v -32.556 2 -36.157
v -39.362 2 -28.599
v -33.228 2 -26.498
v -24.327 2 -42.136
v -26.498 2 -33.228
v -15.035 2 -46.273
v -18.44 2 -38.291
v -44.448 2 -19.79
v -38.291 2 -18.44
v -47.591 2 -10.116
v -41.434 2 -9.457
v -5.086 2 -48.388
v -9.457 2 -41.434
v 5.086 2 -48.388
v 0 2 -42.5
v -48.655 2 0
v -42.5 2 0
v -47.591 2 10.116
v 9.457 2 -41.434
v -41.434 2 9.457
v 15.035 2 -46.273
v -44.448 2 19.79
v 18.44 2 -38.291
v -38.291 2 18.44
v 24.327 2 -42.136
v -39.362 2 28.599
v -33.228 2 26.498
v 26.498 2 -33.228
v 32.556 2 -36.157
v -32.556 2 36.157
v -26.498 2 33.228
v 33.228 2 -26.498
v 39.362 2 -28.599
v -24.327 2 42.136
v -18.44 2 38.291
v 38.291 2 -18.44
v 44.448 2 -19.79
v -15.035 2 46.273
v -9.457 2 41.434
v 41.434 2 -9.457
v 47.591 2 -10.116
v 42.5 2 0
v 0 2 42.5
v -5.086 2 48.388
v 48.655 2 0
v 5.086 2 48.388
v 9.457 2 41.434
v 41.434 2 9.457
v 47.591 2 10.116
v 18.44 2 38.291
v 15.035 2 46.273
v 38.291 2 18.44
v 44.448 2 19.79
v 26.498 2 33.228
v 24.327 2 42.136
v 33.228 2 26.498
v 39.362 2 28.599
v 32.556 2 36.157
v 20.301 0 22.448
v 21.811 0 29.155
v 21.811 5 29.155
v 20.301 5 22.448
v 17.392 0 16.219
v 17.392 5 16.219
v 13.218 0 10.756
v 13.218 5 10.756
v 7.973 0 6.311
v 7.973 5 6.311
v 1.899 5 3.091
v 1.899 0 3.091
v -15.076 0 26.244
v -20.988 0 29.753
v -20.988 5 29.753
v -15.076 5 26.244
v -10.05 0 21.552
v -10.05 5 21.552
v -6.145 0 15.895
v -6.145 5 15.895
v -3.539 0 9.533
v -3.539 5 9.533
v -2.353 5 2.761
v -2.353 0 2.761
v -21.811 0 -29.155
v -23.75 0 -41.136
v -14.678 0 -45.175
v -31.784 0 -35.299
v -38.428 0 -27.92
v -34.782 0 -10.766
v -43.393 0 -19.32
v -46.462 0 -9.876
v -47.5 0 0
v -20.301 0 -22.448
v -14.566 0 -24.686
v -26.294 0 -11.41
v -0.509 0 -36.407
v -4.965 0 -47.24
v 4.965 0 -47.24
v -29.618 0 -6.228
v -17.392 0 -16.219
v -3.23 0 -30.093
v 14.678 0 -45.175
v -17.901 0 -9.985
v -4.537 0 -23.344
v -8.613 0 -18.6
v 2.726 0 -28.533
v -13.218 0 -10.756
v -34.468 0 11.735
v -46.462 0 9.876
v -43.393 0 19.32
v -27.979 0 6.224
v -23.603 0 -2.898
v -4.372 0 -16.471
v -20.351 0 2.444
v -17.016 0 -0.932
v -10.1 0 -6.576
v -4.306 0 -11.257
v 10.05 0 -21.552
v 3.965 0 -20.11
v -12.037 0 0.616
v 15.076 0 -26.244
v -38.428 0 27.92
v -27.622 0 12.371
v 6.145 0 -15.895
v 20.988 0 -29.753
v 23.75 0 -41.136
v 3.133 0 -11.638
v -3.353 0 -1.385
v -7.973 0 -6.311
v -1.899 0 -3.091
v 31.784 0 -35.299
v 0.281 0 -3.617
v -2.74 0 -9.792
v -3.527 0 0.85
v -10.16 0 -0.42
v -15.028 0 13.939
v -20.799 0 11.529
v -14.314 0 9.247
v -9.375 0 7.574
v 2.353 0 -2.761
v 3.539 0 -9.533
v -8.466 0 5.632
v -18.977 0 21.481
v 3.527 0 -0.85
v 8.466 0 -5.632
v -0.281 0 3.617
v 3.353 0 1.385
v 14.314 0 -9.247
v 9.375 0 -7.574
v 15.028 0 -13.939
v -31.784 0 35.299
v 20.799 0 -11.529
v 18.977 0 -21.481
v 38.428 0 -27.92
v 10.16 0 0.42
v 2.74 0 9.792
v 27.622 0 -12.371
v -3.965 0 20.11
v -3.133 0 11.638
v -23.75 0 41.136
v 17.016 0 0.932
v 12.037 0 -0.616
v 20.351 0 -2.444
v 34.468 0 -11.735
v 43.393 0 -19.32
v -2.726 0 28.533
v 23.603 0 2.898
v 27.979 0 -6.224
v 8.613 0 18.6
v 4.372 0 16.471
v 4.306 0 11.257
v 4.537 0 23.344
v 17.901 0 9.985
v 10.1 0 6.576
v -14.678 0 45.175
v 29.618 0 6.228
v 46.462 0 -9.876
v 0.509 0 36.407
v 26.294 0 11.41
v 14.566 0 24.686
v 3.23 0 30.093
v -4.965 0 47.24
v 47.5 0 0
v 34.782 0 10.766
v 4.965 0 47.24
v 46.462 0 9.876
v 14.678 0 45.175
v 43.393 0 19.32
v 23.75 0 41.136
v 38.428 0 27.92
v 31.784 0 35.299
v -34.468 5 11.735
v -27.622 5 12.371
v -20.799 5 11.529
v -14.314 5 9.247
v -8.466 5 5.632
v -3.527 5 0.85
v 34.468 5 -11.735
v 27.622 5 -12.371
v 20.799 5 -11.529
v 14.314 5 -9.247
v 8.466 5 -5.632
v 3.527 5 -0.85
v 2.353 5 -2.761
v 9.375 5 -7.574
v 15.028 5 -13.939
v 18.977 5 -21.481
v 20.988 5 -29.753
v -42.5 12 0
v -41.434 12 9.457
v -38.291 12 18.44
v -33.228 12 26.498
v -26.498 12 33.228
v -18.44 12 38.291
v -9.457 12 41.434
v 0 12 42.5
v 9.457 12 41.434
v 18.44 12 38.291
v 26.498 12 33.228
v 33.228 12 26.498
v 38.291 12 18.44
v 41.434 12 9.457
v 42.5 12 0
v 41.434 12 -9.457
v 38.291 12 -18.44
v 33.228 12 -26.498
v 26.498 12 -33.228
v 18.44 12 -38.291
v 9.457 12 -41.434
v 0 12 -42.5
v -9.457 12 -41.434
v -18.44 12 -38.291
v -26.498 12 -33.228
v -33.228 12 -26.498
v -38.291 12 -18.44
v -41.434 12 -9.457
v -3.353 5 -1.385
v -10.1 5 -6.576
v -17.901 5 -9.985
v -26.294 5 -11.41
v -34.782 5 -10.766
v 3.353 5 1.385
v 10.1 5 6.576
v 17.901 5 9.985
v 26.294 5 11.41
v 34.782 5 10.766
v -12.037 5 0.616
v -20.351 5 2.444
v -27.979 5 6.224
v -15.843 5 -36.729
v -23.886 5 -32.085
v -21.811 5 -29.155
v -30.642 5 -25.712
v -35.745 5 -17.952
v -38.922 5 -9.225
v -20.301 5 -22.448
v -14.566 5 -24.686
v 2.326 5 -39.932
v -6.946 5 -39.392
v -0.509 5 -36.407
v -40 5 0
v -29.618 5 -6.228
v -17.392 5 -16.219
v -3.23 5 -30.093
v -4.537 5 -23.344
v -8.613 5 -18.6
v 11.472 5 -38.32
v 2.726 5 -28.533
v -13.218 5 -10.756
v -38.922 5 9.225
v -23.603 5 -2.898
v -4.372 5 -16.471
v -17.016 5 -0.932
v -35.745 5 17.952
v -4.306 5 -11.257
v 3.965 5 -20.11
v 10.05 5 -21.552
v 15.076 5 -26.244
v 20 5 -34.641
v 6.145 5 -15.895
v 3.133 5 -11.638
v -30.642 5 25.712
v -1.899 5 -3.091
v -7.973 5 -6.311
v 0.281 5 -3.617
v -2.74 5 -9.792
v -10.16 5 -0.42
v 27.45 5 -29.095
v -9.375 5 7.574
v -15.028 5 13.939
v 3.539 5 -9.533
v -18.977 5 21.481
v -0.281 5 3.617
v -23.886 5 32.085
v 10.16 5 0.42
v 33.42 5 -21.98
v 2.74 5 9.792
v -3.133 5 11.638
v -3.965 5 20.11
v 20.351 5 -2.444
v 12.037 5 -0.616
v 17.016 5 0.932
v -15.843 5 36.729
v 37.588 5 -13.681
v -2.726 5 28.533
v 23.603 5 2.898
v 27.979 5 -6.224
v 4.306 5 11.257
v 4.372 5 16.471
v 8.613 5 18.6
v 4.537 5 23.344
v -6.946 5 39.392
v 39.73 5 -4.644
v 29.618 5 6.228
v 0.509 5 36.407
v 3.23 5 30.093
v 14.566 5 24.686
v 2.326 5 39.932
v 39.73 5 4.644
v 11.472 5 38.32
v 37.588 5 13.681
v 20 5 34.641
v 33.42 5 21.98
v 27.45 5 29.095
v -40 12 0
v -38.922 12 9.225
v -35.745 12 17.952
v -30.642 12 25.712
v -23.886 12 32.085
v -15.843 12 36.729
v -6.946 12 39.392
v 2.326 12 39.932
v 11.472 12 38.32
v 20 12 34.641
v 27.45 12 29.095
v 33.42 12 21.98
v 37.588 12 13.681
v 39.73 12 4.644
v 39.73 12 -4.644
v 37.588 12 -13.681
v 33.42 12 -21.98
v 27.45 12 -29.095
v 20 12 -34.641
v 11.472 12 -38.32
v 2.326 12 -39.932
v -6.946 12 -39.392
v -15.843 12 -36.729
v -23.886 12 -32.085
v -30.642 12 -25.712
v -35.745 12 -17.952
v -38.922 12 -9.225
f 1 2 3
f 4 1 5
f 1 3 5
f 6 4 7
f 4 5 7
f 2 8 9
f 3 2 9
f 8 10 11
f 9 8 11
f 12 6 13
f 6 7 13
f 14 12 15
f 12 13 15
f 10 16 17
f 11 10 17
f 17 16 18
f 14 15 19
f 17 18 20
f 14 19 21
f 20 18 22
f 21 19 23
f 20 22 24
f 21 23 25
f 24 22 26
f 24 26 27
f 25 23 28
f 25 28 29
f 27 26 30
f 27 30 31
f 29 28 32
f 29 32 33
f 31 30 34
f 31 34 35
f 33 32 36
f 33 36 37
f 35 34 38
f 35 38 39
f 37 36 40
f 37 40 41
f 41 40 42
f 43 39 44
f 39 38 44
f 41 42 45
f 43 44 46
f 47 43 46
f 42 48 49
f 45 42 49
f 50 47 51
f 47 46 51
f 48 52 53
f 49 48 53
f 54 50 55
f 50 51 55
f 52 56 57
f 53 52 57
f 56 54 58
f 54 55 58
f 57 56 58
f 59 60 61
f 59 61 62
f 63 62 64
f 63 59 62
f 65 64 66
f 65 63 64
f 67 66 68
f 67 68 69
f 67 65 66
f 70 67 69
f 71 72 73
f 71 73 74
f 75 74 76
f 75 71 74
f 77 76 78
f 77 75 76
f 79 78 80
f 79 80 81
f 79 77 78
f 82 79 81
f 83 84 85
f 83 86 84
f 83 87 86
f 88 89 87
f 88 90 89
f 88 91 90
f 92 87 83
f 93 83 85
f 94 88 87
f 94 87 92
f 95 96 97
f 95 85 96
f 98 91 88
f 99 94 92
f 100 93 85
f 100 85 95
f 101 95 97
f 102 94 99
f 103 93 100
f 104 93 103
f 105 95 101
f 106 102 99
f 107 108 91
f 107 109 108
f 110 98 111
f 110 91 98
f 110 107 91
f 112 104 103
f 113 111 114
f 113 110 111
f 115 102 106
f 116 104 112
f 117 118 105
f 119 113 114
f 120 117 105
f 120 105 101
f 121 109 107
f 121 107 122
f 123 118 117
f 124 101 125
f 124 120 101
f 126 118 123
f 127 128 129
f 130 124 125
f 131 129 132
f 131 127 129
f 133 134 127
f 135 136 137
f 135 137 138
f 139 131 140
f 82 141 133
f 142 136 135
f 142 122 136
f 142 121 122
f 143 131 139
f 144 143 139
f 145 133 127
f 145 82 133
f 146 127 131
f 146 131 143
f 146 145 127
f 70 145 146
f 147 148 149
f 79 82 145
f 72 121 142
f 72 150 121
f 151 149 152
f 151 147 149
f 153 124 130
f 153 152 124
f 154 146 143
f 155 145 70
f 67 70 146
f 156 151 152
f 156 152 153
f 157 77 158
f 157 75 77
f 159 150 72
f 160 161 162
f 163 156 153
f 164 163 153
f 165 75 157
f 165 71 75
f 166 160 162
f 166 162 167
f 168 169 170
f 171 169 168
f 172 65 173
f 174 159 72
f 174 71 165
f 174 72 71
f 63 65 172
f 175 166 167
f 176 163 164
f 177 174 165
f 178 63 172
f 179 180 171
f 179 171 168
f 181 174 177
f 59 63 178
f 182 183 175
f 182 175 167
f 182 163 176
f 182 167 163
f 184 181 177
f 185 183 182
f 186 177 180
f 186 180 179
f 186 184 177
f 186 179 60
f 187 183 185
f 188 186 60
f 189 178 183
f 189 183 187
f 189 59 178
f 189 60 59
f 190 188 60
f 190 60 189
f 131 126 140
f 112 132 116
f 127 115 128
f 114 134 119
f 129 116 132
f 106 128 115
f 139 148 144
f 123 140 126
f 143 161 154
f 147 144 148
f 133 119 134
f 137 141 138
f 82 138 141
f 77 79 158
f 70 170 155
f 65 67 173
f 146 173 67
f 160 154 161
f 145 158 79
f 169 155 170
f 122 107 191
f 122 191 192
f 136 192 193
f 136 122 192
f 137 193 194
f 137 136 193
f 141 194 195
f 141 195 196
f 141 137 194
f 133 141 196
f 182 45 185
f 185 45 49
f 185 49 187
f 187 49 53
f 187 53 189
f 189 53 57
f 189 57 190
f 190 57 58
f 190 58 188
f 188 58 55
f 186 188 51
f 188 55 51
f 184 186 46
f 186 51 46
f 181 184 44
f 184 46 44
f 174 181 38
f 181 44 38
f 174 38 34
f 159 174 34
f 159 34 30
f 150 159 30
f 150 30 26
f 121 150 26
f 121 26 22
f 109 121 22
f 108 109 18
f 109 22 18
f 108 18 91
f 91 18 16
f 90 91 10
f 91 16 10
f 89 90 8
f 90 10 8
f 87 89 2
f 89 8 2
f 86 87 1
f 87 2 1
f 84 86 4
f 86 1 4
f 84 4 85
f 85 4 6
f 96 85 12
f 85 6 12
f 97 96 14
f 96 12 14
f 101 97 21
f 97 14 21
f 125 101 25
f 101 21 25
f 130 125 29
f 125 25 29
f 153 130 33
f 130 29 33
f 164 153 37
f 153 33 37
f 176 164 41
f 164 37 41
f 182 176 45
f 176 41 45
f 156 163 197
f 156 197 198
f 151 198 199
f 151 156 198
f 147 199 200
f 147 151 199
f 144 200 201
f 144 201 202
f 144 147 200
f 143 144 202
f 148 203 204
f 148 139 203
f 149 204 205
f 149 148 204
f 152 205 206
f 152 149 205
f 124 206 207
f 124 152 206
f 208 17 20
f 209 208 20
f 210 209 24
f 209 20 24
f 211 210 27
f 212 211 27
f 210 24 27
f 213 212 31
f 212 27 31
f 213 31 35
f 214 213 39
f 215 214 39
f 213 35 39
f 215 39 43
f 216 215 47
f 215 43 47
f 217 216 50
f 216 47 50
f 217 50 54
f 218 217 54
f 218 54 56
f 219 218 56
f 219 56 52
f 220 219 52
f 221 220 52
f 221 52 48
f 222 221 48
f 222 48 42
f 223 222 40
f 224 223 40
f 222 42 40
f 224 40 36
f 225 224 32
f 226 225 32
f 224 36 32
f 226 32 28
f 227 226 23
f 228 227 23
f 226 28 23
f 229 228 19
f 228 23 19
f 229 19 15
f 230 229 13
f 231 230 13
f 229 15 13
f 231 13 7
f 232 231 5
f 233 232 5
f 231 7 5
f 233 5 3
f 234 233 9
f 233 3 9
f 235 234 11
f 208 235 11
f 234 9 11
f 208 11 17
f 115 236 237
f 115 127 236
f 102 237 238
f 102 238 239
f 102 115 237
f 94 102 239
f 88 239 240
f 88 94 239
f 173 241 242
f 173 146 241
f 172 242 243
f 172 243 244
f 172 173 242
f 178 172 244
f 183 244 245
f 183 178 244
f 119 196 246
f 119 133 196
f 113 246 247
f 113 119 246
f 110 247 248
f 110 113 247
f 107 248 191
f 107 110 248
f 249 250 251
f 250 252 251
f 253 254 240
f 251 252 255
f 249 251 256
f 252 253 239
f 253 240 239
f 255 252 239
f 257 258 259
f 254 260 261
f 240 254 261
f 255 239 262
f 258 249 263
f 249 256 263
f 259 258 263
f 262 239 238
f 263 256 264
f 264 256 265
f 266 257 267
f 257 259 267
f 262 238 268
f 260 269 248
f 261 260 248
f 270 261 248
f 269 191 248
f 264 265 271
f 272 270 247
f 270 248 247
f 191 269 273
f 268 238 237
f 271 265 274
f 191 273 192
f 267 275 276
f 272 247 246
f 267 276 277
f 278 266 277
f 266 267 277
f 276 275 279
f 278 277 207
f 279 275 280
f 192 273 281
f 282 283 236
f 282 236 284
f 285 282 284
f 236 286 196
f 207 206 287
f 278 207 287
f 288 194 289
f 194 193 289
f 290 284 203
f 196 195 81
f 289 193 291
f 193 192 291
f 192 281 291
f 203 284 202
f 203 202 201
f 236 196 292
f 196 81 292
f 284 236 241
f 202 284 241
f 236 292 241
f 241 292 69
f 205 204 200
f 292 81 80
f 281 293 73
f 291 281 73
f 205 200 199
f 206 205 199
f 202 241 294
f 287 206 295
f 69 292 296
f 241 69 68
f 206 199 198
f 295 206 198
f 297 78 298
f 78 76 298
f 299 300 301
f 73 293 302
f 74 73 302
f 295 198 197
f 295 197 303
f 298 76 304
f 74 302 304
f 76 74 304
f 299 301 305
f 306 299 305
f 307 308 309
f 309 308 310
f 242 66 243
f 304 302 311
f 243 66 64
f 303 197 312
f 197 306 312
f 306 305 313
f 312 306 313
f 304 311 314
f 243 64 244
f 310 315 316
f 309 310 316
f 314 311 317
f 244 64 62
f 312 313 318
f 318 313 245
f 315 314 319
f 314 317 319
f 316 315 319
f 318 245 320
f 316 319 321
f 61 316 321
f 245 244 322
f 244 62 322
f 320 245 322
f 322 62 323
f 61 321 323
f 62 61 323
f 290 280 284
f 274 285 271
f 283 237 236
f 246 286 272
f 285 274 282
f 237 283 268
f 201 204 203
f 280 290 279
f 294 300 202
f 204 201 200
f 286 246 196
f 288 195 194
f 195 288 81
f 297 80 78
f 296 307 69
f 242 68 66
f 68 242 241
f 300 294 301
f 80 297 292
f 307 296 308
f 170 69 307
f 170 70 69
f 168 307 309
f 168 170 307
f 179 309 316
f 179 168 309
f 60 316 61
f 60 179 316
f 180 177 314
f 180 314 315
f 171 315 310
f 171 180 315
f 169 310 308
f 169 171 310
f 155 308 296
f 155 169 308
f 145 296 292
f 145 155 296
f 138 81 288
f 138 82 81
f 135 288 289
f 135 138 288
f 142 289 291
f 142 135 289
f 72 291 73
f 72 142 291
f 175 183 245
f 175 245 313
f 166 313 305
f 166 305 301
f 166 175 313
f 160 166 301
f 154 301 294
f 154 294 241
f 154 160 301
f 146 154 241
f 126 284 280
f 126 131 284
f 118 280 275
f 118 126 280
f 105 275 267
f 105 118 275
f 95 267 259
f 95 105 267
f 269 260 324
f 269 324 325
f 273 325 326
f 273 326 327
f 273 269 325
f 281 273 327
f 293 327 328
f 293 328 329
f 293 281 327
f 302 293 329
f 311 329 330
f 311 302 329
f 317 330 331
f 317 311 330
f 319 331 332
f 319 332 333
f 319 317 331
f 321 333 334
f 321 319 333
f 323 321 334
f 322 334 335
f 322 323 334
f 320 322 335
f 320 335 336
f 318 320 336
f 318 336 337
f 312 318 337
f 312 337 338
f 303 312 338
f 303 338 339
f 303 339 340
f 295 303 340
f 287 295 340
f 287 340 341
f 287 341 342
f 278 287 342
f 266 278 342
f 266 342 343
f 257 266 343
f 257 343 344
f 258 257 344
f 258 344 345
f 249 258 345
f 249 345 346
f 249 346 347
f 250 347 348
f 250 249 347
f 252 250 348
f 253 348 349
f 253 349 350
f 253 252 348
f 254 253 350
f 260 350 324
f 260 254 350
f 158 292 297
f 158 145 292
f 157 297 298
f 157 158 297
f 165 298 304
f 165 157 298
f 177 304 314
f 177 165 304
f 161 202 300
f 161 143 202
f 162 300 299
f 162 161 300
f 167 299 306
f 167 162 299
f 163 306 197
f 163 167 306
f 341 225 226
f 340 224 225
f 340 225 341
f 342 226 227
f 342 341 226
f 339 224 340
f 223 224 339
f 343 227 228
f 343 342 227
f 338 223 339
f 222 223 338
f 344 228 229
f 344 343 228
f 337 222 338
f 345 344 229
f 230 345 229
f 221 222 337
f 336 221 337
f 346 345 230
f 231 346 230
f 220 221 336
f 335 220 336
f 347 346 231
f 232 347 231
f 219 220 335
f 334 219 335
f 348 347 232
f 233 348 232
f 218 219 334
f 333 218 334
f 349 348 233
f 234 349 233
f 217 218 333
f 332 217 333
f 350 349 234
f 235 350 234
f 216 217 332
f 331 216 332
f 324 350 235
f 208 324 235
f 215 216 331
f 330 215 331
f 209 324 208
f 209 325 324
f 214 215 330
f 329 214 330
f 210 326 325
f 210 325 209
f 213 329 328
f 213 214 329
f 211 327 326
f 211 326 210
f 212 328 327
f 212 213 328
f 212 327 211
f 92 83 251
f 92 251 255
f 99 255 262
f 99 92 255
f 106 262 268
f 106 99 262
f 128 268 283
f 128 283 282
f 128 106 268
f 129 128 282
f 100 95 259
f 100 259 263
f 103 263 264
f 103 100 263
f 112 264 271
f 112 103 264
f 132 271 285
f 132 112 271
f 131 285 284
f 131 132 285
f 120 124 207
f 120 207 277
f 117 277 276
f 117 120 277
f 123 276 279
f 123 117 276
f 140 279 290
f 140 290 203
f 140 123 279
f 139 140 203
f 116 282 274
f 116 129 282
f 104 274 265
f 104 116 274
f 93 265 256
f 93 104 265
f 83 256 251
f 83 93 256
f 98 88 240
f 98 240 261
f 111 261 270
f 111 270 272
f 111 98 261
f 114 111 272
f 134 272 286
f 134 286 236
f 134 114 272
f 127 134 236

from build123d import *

# Parameters (mm, degrees)
F0_R     = 47.5
F1_DEPTH = 2
F1_TAPER = -30
F2_R     = 42.5
F2_R_2   = 40
F3_DEPTH = 10
F5_DEPTH = 25
F6_DEPTH = 3


with BuildPart() as f1:
    # F0 (on Front) → F1 (new body)
    with BuildSketch(Plane.XZ):
        Circle(F0_R)
    extrude(amount=-F1_DEPTH, taper=F1_TAPER)

    # F2 (on face) → F3 (join)
    with BuildSketch(Plane(origin=(0, 2, 0), x_dir=(-1, 0, 0), z_dir=(0, 1, 0))):
        Circle(F2_R)
        Circle(F2_R_2, mode=Mode.SUBTRACT)
    extrude(amount=F3_DEPTH)

    # F4 (on face) → F5 (cut)
    with BuildSketch(Plane(origin=(0, 2, 0), x_dir=(-1, 0, 0), z_dir=(0, 1, 0))):
        with BuildLine():
            ThreePointArc((20.9875792028, 29.753044393), (7.9449809873, 18.8289116609), (2.3533185627, 2.7609511341))
            ThreePointArc((2.3533185627, 2.7609511341), (15.0280319463, 13.9390568271), (20.9875792028, 29.753044393))
        make_face()
        with BuildLine():
            ThreePointArc((34.4677089509, 11.7345290116), (17.4949812297, 10.5629668651), (3.5267210693, 0.8504104431))
            ThreePointArc((3.5267210693, 0.8504104431), (20.3511052704, 2.4436783097), (34.4677089509, 11.7345290116))
        make_face()
        with BuildLine():
            ThreePointArc((34.7823453941, -10.7661776103), (20.3624932749, -1.7376722511), (3.3530359963, -1.3849581328))
            ThreePointArc((3.3530359963, -1.3849581328), (17.9007480898, -9.9851022645), (34.7823453941, -10.7661776103))
        make_face()
        with BuildLine():
            ThreePointArc((21.8113081051, -29.1545703139), (15.4522249847, -13.3745796286), (1.8986051383, -3.091319775))
            ThreePointArc((1.8986051383, -3.091319775), (8.612913563, -18.5999131547), (21.8113081051, -29.1545703139))
        make_face()
        with BuildLine():
            ThreePointArc((0.5090924591, -36.4069080851), (4.6397319522, -19.9028521733), (-0.2810283514, -3.6169023332))
            ThreePointArc((-0.2810283514, -3.6169023332), (-3.9647612027, -20.1101894077), (0.5090924591, -36.4069080851))
        make_face()
        with BuildLine():
            ThreePointArc((-20.9875792028, -29.753044393), (-7.9449809873, -18.8289116609), (-2.3533185627, -2.7609511341))
            ThreePointArc((-2.3533185627, -2.7609511341), (-15.0280319463, -13.9390568271), (-20.9875792028, -29.753044393))
        make_face()
        with BuildLine():
            ThreePointArc((-34.4677089509, -11.7345290116), (-17.4949812297, -10.5629668651), (-3.5267210693, -0.8504104431))
            ThreePointArc((-3.5267210693, -0.8504104431), (-20.3511052704, -2.4436783097), (-34.4677089509, -11.7345290116))
        make_face()
        with BuildLine():
            ThreePointArc((-21.8113081051, 29.1545703139), (-15.4522249847, 13.3745796286), (-1.8986051383, 3.091319775))
            ThreePointArc((-1.8986051383, 3.091319775), (-8.612913563, 18.5999131547), (-21.8113081051, 29.1545703139))
        make_face()
        with BuildLine():
            ThreePointArc((-0.5090924591, 36.4069080851), (-4.6397319522, 19.9028521733), (0.2810283514, 3.6169023332))
            ThreePointArc((0.2810283514, 3.6169023332), (3.9647612027, 20.1101894077), (-0.5090924591, 36.4069080851))
        make_face()
        with BuildLine():
            ThreePointArc((-34.7823453941, 10.7661776103), (-20.3624932749, 1.7376722511), (-3.3530359963, 1.3849581328))
            ThreePointArc((-3.3530359963, 1.3849581328), (-17.9007480898, 9.9851022645), (-34.7823453941, 10.7661776103))
        make_face()
    extrude(amount=-F5_DEPTH, mode=Mode.SUBTRACT)

    # F6 (add): a face of the model
    f6_faces = [f1.faces().sort_by_distance(p)[0] for p in [
        (0, 2, 0),
    ]]
    extrude(f6_faces, amount=F6_DEPTH)


solid = f1.part
